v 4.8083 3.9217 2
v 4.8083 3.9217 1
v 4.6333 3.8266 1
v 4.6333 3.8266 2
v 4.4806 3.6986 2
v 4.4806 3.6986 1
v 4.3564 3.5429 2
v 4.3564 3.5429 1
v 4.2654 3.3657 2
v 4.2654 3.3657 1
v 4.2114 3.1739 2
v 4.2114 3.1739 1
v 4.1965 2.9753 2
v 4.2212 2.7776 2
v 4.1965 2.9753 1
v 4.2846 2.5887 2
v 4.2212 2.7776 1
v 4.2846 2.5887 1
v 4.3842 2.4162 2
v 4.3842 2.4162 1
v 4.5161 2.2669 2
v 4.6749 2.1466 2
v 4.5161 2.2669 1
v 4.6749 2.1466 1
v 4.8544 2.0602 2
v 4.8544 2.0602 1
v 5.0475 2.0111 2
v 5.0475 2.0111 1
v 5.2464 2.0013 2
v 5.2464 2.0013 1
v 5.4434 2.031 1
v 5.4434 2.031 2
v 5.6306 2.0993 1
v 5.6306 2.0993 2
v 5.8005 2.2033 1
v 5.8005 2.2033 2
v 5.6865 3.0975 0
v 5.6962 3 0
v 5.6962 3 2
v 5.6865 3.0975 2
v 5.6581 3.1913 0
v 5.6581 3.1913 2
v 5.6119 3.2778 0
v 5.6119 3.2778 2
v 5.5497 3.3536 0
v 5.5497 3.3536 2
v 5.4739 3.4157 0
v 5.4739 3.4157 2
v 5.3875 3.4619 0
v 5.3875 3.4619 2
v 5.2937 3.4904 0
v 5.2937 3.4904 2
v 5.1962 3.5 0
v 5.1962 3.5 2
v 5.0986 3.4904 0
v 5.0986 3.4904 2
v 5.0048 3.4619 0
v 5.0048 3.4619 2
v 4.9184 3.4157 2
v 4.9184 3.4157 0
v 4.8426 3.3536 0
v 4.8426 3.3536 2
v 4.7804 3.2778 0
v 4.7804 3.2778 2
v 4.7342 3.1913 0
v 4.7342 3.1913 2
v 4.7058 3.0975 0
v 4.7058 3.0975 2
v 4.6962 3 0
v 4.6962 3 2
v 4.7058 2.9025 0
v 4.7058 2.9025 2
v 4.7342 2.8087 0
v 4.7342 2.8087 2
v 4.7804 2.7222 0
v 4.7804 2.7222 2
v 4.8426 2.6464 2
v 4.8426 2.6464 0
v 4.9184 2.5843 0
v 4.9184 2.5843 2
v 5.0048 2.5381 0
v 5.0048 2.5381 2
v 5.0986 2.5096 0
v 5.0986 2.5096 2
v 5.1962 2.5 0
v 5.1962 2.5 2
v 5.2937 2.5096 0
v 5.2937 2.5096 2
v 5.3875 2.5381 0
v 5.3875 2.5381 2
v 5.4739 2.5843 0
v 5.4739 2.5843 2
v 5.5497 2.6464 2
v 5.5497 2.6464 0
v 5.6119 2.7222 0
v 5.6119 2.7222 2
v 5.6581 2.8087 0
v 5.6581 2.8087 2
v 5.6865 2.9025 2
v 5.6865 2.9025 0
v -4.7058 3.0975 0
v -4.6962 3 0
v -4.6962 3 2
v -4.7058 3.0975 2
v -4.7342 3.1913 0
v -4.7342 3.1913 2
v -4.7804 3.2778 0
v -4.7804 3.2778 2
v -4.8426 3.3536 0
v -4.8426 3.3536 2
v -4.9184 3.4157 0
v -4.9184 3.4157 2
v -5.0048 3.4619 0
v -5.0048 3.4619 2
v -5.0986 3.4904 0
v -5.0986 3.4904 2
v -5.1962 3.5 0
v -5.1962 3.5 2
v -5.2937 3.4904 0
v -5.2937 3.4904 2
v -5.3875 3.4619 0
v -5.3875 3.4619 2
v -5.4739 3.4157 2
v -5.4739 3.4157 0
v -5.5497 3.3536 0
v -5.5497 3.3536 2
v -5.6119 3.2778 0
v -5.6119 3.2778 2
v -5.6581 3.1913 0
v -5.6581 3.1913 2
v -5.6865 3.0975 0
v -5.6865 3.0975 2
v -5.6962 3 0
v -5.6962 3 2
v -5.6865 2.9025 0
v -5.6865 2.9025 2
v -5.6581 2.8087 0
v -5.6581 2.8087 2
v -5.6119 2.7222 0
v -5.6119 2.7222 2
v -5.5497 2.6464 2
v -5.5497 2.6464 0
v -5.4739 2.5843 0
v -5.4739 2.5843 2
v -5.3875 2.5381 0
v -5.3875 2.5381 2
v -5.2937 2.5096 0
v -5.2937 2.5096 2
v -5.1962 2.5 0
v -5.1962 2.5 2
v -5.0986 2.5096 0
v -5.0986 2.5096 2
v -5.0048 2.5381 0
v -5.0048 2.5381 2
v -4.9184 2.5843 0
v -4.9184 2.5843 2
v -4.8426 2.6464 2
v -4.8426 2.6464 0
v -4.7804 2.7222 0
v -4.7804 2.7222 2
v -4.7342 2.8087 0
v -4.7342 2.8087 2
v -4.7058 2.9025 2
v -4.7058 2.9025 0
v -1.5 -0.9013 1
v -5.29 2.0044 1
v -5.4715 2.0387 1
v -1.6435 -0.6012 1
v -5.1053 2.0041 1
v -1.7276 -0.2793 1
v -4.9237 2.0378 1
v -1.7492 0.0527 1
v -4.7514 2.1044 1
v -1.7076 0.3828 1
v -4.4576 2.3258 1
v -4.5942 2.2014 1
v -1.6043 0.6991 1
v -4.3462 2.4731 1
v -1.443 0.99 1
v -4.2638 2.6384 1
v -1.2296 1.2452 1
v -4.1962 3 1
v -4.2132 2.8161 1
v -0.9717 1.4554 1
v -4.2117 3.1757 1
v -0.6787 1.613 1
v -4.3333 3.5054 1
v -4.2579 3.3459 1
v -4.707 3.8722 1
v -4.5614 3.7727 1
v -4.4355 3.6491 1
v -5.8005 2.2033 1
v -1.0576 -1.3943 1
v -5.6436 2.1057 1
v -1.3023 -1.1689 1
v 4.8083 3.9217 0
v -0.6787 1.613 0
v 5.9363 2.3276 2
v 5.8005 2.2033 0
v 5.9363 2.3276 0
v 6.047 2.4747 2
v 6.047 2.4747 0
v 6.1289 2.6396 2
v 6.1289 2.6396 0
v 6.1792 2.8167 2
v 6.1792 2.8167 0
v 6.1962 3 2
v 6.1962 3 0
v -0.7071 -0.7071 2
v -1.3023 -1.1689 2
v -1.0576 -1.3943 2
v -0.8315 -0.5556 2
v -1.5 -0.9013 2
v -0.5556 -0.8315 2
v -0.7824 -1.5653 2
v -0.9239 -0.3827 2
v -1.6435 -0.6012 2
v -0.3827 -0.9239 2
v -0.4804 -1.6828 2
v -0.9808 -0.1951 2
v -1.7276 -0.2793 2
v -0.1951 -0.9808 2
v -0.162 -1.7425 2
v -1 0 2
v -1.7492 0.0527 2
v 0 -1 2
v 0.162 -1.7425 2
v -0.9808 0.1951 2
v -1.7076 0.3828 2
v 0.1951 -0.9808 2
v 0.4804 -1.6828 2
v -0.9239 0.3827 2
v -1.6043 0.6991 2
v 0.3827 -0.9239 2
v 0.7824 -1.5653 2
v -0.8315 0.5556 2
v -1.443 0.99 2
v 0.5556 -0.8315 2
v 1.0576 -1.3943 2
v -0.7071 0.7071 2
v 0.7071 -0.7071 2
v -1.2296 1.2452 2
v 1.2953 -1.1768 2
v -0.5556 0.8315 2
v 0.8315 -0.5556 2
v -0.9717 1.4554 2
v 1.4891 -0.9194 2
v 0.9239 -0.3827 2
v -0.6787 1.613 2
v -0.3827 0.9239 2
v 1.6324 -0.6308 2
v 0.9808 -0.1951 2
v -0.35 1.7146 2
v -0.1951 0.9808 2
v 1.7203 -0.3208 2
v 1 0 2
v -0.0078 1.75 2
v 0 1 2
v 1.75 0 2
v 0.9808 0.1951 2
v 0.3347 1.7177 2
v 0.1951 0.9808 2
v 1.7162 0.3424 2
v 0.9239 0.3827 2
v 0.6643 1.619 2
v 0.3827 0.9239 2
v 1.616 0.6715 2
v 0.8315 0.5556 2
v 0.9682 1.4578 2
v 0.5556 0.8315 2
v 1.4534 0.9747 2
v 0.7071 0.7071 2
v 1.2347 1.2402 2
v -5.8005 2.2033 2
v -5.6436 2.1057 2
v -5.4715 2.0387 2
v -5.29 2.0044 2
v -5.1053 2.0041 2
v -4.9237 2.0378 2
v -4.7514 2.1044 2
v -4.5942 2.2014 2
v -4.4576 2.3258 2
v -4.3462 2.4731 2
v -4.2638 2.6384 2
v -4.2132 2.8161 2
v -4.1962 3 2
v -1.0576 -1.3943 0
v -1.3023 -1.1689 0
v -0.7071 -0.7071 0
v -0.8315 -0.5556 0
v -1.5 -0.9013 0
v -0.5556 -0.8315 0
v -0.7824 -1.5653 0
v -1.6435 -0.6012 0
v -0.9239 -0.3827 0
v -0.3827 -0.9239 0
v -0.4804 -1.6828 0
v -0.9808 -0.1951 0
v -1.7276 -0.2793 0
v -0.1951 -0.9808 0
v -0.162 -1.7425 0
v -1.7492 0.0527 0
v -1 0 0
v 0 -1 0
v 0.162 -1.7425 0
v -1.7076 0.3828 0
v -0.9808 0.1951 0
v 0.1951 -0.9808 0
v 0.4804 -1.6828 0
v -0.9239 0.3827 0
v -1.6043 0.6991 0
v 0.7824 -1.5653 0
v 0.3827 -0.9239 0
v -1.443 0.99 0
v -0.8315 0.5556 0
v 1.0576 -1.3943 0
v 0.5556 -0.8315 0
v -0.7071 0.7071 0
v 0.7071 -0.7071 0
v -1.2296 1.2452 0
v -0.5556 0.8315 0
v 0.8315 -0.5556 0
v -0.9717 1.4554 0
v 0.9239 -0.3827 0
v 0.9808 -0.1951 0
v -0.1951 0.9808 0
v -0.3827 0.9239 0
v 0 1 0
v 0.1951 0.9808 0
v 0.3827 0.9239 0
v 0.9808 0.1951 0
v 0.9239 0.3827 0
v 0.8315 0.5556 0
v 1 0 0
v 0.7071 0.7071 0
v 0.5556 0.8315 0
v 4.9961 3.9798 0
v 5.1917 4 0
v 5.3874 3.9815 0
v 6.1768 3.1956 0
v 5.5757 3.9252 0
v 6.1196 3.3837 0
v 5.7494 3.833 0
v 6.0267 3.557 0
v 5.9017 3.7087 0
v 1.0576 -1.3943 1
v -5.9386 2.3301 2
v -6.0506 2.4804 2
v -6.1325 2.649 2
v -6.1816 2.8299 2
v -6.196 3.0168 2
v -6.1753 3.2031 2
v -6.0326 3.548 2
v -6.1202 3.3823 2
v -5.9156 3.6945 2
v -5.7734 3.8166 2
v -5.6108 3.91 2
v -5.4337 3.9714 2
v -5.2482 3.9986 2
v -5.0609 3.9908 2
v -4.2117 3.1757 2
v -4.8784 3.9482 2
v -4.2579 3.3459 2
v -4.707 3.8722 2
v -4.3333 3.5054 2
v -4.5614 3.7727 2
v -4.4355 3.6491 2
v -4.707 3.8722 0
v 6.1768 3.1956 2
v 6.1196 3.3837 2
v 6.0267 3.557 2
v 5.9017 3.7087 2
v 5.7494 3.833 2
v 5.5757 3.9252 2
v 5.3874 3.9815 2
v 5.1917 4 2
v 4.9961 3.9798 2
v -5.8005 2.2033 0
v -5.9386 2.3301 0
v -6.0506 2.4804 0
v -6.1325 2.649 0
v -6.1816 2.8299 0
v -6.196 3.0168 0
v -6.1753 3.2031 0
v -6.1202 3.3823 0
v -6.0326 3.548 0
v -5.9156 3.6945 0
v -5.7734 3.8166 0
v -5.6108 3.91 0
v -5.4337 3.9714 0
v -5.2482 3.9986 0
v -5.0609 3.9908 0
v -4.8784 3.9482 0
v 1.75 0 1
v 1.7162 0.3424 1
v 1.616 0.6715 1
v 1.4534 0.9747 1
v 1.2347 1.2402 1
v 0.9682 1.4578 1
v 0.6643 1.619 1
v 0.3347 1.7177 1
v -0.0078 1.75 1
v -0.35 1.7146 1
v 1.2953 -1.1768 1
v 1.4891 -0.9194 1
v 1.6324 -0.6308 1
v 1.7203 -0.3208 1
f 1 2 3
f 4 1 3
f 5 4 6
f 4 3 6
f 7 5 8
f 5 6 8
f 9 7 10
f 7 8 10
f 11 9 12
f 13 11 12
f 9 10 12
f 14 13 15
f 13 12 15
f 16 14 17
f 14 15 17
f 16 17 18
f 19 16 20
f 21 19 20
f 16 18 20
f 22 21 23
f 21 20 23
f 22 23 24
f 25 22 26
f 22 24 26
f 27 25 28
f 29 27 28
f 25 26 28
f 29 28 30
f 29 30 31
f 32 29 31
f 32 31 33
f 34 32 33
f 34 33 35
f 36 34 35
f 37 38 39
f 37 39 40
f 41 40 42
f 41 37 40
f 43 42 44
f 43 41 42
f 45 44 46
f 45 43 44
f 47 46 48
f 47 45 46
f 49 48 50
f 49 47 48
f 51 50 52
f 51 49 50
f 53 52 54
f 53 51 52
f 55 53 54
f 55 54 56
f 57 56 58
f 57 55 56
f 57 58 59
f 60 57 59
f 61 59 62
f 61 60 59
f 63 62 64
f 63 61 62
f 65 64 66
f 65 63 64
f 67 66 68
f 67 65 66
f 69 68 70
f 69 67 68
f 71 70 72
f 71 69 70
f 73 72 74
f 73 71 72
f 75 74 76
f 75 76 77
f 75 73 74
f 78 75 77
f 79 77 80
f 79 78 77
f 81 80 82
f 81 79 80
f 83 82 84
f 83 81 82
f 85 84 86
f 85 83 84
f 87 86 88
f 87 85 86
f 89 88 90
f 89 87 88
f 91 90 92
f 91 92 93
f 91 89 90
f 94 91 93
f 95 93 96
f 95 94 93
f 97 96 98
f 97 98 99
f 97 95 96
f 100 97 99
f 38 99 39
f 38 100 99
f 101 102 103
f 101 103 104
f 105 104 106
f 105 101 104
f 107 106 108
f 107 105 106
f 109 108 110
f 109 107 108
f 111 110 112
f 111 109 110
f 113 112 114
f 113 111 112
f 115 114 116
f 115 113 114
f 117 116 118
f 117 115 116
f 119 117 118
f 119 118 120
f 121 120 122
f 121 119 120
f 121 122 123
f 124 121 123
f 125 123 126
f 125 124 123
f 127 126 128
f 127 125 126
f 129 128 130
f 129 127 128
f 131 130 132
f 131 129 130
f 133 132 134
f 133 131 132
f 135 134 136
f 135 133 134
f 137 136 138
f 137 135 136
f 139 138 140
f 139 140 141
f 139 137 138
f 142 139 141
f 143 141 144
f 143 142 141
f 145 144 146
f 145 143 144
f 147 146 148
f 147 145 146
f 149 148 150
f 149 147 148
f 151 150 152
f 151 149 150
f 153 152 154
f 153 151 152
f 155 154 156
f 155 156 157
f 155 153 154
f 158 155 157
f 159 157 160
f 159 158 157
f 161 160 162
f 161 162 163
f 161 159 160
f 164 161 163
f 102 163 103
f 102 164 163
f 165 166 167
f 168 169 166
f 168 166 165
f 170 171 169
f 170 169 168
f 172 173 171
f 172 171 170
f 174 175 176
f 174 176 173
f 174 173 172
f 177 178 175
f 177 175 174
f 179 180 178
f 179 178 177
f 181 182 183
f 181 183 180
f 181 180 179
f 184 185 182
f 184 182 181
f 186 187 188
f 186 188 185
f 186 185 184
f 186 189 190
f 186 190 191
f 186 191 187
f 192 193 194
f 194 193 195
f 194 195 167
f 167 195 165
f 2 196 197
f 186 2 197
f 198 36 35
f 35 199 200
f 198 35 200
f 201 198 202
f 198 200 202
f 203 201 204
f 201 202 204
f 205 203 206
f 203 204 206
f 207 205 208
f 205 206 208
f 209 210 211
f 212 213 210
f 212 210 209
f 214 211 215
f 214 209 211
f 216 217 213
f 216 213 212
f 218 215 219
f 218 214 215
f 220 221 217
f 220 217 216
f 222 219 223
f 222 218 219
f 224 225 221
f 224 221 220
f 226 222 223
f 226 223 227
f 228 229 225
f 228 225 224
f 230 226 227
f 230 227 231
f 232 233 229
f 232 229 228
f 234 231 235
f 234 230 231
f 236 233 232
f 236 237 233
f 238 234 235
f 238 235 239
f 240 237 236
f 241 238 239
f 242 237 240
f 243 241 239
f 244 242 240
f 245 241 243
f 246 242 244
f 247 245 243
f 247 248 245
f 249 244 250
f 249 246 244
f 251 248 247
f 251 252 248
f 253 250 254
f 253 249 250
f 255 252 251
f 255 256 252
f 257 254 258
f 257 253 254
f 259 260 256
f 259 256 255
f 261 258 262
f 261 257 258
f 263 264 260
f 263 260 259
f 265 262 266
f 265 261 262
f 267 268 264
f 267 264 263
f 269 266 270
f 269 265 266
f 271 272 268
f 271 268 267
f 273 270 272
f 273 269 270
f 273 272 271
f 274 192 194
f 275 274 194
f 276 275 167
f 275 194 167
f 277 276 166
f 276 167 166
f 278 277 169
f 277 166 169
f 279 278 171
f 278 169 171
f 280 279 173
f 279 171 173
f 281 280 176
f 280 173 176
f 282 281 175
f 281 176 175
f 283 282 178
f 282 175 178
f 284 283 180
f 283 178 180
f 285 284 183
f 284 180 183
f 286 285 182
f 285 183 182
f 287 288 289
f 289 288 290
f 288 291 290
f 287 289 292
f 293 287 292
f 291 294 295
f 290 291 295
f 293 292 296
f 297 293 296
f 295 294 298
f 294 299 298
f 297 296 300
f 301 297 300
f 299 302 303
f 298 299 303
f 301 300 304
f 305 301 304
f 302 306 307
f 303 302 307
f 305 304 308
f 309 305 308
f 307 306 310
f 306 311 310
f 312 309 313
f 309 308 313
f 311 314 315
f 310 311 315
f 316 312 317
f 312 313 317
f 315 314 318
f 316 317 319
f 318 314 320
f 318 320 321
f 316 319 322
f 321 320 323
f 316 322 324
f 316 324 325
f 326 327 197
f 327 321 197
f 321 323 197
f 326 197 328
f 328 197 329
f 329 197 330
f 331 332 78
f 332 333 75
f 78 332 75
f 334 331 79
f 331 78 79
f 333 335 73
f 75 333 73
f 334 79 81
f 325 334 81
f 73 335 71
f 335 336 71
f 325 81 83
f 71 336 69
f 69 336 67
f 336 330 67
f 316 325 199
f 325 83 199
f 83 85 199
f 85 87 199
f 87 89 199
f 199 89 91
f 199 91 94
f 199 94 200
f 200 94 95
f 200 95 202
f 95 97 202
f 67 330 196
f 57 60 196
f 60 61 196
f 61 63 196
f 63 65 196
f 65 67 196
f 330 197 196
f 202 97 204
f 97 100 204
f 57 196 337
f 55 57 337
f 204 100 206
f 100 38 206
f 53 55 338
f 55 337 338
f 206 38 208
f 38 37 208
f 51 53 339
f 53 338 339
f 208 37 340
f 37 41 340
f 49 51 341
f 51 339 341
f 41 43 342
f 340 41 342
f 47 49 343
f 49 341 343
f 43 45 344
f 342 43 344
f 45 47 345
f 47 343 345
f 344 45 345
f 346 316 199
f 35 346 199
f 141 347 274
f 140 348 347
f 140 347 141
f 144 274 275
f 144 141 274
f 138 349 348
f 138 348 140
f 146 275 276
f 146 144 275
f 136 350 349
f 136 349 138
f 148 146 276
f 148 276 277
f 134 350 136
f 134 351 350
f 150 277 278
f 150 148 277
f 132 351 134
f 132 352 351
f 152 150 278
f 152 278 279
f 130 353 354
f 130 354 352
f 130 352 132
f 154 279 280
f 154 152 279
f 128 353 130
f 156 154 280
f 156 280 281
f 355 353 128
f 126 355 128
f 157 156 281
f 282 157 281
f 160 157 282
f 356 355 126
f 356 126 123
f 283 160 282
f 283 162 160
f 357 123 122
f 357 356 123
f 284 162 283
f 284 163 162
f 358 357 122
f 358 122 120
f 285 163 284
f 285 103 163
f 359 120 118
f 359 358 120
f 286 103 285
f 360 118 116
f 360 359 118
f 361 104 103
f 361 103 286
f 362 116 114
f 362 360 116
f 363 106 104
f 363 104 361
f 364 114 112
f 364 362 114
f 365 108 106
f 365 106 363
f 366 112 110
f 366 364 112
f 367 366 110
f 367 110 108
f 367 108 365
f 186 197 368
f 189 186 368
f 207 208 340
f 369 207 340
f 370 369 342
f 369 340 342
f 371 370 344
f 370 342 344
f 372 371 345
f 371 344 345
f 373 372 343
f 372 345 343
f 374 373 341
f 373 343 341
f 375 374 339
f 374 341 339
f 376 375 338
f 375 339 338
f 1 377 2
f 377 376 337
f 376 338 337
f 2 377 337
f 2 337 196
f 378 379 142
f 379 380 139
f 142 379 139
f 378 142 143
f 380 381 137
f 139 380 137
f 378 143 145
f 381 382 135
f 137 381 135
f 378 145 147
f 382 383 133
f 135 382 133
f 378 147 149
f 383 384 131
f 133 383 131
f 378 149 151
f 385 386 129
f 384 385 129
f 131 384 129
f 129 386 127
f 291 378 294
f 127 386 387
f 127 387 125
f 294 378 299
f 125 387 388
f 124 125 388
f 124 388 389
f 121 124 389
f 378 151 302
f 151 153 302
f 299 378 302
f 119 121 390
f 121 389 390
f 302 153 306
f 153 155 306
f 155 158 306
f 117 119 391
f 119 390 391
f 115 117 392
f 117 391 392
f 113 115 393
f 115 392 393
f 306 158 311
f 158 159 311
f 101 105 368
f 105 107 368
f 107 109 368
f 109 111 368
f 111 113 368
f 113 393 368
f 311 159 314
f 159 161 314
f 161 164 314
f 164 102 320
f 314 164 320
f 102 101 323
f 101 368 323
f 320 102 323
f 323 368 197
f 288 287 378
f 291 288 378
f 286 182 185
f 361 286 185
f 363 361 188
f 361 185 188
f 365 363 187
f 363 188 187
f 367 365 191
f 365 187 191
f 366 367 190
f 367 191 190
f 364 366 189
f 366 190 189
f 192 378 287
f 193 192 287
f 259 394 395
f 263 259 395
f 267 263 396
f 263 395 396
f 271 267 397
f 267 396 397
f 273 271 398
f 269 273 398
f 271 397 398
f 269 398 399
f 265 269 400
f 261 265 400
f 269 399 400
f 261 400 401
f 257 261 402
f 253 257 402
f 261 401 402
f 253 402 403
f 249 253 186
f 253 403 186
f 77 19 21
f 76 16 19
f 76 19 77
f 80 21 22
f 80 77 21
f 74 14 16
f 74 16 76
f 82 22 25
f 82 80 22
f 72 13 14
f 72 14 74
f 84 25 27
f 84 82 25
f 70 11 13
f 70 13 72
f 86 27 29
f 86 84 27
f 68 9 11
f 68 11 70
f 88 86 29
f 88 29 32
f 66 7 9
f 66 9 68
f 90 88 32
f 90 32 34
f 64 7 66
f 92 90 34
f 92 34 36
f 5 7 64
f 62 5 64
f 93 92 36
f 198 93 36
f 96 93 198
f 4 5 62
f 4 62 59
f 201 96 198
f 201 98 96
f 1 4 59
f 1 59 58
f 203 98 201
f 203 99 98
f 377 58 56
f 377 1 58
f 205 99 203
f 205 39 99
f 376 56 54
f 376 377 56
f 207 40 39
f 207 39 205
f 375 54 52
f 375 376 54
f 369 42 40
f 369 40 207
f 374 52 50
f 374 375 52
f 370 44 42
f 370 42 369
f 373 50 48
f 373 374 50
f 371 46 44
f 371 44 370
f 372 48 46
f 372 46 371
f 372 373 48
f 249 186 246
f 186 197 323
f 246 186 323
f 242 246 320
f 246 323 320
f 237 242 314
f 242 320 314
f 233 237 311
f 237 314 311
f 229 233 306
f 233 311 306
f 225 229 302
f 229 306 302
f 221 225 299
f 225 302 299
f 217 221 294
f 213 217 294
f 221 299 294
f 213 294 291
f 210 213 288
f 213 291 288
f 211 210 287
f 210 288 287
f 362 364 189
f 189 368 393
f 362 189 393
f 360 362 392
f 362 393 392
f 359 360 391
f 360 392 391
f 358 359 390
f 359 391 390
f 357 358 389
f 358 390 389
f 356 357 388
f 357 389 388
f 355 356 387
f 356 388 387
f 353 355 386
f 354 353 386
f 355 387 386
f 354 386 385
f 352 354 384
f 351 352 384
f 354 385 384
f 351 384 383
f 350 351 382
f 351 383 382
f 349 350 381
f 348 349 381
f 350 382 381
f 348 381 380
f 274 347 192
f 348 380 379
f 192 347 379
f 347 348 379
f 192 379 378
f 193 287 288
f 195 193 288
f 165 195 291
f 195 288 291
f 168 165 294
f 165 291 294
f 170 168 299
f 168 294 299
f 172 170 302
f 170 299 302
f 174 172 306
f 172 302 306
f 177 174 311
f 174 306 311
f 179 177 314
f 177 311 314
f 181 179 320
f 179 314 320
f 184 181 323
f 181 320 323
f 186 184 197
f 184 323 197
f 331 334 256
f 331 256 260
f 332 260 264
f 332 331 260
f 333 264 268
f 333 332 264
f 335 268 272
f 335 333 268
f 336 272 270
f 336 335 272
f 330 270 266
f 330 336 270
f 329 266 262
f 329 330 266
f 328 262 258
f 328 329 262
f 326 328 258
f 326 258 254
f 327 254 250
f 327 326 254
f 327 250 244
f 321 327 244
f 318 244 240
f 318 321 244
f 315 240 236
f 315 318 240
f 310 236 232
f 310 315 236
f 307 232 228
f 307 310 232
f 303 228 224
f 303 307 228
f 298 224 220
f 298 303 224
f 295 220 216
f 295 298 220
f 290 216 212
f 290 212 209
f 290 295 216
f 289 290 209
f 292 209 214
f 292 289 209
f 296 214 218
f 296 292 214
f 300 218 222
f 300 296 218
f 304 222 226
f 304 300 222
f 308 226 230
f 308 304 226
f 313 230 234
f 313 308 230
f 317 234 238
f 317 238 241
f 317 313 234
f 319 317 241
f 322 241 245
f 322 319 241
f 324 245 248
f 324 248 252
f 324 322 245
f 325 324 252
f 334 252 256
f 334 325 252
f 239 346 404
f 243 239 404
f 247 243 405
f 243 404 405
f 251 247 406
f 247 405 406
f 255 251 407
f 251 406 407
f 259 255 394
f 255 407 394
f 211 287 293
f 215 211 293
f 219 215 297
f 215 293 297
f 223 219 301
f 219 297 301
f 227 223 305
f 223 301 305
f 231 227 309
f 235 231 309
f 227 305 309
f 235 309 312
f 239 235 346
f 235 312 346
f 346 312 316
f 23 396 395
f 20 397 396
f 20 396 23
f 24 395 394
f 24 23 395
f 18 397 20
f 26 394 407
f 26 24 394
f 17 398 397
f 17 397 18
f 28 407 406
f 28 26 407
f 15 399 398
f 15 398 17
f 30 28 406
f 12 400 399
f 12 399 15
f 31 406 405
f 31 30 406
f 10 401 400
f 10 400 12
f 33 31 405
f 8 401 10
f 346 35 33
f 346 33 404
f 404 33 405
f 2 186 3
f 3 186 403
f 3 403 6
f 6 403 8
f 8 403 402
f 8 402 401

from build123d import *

# Parameters (mm, degrees)
F0_R     = 1
F1_DEPTH = 2
F0_R_2   = 0.5
F2_DEPTH = 1
F3_DEPTH = 2
F4_DEPTH = 1


with BuildPart() as f1:
    # F0 (on Top) → F1 (new body)
    with BuildSketch(Plane.XY):
        with BuildLine():
            ThreePointArc((1.057580206, -1.3942826499), (1.5673648842, -0.7783747939), (1.75, 0))
            ThreePointArc((1.75, 0), (0.9681904098, 1.4577747873), (-0.6786940919, 1.6130326499))
            ThreePointArc((-0.6786940919, 1.6130326499), (-1.7362742979, 0.21875), (-1.057580206, -1.3942826499))
            ThreePointArc((-1.057580206, -1.3942826499), (0, -1.75), (1.057580206, -1.3942826499))
        make_face()
        Circle(F0_R, mode=Mode.SUBTRACT)
    extrude(amount=F1_DEPTH)



with BuildPart() as f1b:
    # F0 (on Top) → F1, piece 2 (new body)
    with BuildSketch(Plane.XY):
        with BuildLine():
            ThreePointArc((6.1961524227, 3), (5.7494040854, 3.8330141642), (4.8083272274, 3.9217329428))
            ThreePointArc((4.8083272274, 3.9217329428), (4.3301270189, 2.5), (5.800483969, 2.2032670572))
            ThreePointArc((5.800483969, 2.2032670572), (6.0917894994, 2.5552144035), (6.1961524227, 3))
        make_face()
        with Locations((5.1961524227, 3)):
            Circle(F0_R_2, mode=Mode.SUBTRACT)
    extrude(amount=F1_DEPTH)


with BuildPart() as f1_1:
    add(f1.part)

    add(f1b.part)  # F2 merges F1b
    # F0 (on Top) → F2 (join)
    with BuildSketch(Plane.XY):
        with BuildLine():
            ThreePointArc((-0.6786940919, 1.6130326499), (0.9681904098, 1.4577747873), (1.75, 0))
            ThreePointArc((1.75, 0), (1.5673648842, -0.7783747939), (1.057580206, -1.3942826499))
            Line((1.057580206, -1.3942826499), (5.800483969, 2.2032670572))
            ThreePointArc((5.800483969, 2.2032670572), (4.3301270189, 2.5), (4.8083272274, 3.9217329428))
            Line((4.8083272274, 3.9217329428), (-0.6786940919, 1.6130326499))
        make_face()
    extrude(amount=F2_DEPTH)


with BuildPart() as f3:
    # F0 (on Top) → F3 (new body)
    with BuildSketch(Plane.XY):
        with BuildLine():
            ThreePointArc((-4.1961524227, 3), (-4.3332649527, 3.5053960962), (-4.7070028508, 3.8721999176))
            ThreePointArc((-4.7070028508, 3.8721999176), (-6.032603823, 3.5480411071), (-5.800483969, 2.2032670572))
            ThreePointArc((-5.800483969, 2.2032670572), (-4.7513668262, 2.1043629233), (-4.1961524227, 3))
        make_face()
        with Locations((-5.1961524227, 3)):
            Circle(F0_R_2, mode=Mode.SUBTRACT)
    extrude(amount=F3_DEPTH)

    # F0 (on Top) → F4 (join)
    with BuildSketch(Plane.XY):
        with BuildLine():
            ThreePointArc((-1.057580206, -1.3942826499), (-1.7362742979, 0.21875), (-0.6786940919, 1.6130326499))
            Line((-0.6786940919, 1.6130326499), (-4.7070028508, 3.8721999176))
            ThreePointArc((-4.7070028508, 3.8721999176), (-4.3332649527, 3.5053960962), (-4.1961524227, 3))
            ThreePointArc((-4.1961524227, 3), (-4.7513668262, 2.1043629233), (-5.800483969, 2.2032670572))
            Line((-5.800483969, 2.2032670572), (-1.057580206, -1.3942826499))
        make_face()
    extrude(amount=F4_DEPTH)


solid = Compound([f1_1.part, f3.part])
